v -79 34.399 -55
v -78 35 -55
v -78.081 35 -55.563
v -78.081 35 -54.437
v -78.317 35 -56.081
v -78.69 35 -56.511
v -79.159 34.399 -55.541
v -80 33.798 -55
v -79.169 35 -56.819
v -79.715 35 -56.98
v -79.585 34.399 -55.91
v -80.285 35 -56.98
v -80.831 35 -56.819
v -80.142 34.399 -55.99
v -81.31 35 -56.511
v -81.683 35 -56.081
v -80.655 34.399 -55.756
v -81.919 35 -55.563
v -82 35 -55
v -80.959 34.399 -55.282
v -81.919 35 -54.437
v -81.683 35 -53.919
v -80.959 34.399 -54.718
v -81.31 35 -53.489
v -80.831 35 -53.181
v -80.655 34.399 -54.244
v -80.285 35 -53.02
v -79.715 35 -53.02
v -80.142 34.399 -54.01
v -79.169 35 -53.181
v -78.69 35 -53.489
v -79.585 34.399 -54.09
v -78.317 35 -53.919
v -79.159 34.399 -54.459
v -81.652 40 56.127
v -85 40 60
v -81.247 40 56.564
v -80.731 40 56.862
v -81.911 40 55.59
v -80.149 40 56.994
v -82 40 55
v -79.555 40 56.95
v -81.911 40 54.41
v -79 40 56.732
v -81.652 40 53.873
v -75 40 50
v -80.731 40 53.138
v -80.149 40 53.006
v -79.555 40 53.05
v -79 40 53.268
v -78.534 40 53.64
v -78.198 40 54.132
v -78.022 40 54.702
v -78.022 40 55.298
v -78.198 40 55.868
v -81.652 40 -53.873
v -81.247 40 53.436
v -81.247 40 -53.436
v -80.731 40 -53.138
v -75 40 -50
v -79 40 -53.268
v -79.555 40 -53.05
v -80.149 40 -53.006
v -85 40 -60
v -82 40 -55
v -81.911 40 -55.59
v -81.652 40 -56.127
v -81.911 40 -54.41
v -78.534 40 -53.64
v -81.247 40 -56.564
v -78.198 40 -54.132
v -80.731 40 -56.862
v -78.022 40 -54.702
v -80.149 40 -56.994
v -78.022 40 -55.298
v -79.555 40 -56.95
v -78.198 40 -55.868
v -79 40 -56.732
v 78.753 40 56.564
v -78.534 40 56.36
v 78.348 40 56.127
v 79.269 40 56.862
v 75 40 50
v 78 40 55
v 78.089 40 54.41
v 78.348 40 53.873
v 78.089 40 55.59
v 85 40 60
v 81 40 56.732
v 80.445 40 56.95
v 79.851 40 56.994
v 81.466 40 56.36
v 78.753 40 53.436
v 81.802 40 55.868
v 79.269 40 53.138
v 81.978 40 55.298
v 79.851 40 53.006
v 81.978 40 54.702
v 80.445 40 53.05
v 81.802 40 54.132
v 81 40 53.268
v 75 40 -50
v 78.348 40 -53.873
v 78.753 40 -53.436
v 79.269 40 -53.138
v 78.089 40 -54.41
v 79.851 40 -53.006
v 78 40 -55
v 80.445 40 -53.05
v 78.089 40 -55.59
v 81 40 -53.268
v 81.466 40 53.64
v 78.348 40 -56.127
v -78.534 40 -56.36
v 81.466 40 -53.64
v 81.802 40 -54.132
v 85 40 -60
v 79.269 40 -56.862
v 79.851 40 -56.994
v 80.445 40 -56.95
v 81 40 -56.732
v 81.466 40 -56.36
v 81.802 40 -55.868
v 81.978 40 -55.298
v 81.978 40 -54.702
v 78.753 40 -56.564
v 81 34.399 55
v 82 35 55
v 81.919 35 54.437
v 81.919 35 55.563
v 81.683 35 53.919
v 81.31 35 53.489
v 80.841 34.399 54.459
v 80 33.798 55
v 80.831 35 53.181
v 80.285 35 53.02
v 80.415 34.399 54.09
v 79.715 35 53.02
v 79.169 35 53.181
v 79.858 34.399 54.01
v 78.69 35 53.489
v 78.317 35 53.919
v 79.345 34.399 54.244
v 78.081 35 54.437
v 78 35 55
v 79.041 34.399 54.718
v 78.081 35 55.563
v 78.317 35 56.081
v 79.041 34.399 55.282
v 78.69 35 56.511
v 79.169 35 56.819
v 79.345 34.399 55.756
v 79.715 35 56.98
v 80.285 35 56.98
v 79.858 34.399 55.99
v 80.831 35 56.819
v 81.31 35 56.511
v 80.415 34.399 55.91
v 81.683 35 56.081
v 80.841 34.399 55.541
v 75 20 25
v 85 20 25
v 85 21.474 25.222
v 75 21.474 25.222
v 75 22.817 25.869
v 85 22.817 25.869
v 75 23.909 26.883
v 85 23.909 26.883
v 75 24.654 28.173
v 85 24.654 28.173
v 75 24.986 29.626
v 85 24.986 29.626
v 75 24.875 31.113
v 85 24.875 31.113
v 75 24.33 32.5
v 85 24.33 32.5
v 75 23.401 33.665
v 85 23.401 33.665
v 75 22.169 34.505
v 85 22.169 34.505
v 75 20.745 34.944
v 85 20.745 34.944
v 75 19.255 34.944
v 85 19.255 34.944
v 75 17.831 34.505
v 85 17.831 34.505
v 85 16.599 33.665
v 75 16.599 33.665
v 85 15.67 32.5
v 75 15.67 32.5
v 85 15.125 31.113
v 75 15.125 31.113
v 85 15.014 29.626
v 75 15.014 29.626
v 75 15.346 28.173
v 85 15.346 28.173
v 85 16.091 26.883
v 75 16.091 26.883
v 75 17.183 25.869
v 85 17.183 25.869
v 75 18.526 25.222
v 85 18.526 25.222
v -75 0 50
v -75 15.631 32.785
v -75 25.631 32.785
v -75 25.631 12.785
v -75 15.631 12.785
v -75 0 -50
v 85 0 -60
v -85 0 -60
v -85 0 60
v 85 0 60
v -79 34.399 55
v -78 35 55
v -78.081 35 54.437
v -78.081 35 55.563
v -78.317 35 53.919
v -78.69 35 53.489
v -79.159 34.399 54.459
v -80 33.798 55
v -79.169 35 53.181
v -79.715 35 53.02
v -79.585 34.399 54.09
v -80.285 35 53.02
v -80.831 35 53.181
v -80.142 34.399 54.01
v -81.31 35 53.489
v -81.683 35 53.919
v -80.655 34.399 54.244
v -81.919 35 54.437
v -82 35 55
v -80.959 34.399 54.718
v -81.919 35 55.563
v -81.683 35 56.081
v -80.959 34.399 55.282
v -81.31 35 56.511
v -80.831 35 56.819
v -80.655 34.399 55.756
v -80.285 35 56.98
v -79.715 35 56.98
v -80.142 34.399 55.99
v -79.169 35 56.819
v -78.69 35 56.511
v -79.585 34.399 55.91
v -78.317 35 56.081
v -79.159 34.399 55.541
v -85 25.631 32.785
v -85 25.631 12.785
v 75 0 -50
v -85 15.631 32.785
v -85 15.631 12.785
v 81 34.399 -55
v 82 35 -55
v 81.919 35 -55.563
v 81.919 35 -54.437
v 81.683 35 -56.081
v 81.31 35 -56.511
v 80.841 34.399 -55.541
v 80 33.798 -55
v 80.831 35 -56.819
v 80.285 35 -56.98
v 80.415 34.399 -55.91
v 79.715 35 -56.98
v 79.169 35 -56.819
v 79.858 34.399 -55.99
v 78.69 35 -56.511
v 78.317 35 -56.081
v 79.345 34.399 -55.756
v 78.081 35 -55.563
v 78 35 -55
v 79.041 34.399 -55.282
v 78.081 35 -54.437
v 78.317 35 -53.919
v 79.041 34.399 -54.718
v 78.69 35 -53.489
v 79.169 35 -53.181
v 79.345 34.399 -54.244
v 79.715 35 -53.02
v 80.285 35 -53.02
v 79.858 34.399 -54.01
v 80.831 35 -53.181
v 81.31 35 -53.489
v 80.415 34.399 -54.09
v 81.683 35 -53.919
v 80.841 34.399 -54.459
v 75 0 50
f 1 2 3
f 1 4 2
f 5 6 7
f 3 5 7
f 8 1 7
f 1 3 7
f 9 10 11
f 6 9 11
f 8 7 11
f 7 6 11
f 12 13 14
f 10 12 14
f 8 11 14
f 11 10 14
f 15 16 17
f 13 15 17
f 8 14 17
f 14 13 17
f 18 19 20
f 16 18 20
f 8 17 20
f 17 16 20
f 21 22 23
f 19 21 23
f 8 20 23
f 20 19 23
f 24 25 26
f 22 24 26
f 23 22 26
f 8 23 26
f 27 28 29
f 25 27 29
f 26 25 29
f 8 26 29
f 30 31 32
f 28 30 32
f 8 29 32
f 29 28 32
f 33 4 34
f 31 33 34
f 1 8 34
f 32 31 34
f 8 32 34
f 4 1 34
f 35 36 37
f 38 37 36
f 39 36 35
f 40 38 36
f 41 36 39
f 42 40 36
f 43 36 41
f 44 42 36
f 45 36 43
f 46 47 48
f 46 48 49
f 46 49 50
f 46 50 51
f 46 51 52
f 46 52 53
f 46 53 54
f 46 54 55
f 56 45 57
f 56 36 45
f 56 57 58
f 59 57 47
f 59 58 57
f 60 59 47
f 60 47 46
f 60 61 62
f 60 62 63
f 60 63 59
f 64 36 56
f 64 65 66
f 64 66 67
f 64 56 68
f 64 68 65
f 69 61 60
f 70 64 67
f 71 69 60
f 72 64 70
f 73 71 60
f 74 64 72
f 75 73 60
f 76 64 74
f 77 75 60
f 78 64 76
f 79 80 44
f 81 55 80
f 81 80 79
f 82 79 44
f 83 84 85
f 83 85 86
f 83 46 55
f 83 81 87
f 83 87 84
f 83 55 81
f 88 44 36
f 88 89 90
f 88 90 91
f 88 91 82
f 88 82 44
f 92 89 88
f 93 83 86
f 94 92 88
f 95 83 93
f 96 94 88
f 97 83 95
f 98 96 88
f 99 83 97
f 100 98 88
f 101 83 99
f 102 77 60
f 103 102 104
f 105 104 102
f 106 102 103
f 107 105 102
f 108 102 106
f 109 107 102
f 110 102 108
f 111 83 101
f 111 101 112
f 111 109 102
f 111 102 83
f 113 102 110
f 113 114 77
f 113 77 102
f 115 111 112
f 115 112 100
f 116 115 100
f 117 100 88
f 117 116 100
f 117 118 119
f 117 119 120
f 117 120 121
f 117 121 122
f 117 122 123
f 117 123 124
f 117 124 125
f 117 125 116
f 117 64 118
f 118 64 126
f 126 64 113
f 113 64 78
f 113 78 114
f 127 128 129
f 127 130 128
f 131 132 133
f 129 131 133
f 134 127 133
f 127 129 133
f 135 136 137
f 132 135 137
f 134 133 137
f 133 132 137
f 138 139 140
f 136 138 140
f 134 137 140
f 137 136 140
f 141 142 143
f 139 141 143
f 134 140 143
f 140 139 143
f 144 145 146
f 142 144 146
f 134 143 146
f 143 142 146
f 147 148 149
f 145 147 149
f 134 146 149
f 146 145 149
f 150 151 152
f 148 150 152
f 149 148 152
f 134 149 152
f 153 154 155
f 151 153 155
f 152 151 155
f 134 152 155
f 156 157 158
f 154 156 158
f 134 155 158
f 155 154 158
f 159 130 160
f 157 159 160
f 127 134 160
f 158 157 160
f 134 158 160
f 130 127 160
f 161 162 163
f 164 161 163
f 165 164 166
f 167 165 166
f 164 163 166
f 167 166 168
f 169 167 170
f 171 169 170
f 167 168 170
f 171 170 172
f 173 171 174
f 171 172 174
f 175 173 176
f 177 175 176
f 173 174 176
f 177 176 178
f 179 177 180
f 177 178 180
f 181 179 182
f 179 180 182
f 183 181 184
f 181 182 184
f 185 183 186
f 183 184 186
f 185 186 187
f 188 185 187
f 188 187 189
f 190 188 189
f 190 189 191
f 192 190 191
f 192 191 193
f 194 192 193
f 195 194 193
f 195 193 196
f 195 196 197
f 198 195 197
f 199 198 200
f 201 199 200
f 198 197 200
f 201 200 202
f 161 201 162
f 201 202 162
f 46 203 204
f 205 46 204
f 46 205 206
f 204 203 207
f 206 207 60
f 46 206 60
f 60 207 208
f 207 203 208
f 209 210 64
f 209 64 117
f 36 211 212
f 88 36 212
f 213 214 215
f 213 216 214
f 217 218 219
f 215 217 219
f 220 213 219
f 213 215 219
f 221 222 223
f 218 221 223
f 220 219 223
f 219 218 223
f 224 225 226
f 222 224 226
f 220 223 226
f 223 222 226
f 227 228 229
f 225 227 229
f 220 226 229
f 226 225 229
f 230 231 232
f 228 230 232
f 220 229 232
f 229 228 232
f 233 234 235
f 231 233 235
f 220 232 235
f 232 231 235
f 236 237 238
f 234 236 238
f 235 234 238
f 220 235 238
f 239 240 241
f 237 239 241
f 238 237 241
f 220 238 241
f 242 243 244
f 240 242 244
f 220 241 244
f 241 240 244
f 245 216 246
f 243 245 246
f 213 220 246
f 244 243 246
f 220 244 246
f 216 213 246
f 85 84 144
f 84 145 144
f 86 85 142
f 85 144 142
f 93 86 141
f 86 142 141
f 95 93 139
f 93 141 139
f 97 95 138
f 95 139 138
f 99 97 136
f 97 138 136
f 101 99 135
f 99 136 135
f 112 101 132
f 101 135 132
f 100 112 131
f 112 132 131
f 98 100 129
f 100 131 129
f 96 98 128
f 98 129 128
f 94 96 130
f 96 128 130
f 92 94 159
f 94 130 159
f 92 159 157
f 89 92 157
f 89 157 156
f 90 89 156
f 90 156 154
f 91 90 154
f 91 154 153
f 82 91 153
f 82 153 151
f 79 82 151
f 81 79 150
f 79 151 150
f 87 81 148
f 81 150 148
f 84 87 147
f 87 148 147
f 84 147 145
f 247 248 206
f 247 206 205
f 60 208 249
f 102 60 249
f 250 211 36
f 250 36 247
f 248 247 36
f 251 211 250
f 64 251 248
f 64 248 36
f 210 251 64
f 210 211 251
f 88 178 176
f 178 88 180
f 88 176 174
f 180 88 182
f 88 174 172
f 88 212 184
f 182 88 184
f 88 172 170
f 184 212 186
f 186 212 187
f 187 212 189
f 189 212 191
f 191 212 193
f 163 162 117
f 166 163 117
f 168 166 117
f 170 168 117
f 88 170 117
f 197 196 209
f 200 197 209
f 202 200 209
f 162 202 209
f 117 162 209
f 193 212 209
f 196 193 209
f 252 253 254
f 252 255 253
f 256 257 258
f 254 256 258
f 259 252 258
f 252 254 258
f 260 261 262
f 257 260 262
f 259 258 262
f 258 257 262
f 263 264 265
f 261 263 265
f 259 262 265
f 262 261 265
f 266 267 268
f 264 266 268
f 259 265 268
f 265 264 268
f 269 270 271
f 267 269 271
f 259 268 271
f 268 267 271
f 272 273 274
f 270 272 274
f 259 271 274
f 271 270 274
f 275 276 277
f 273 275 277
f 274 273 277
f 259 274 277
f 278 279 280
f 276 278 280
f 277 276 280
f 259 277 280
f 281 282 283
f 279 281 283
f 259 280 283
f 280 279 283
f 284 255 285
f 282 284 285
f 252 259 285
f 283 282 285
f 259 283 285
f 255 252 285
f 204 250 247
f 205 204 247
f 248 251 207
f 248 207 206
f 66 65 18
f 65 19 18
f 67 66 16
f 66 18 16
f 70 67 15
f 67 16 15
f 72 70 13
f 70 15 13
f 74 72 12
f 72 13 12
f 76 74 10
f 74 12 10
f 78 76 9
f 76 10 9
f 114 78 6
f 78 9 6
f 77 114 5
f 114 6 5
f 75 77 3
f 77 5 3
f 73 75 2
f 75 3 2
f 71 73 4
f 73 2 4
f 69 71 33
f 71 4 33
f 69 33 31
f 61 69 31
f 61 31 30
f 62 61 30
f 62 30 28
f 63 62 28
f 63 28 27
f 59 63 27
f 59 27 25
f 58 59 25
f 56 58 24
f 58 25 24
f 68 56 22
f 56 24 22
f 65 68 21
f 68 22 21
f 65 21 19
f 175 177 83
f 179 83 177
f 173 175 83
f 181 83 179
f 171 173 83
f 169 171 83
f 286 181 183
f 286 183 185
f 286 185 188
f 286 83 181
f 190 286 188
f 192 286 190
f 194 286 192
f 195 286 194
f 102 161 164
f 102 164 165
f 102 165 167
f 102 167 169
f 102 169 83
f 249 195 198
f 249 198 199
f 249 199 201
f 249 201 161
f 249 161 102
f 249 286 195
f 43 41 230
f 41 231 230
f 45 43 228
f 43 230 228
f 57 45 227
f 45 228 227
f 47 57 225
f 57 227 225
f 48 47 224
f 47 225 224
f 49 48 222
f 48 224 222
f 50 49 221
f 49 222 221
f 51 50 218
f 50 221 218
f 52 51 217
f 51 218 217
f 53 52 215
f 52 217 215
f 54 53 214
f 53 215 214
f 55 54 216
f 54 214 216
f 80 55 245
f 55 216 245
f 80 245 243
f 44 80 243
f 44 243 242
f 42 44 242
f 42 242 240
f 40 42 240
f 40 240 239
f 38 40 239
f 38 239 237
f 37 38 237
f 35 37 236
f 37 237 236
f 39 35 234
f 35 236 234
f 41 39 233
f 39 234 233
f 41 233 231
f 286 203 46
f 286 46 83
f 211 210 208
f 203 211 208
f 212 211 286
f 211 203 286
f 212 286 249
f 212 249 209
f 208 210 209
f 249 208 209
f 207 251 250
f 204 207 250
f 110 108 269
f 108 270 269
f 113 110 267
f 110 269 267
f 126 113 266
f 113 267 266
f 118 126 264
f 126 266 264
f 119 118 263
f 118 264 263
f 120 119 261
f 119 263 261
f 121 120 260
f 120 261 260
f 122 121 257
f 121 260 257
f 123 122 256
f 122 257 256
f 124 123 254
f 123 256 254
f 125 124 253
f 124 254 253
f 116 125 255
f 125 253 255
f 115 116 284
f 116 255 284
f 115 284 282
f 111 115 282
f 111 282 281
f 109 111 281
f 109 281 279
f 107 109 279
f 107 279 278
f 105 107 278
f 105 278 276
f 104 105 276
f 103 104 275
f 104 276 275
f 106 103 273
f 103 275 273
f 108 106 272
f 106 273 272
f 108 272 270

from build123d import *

# Parameters (mm, degrees)
SKETCH1_W                 = 170
SKETCH1_H                 = 120
SKETCH1_W_2               = 150
SKETCH1_H_2               = 100
EXTRUDE_THIN1_DEPTH       = 40
SKETCH2_R                 = 5
CUT_EXTRUDE1_DEPTH        = 10
F_4_0MM_DOWEL_HOLE1_D     = 4
F_4_0MM_DOWEL_HOLE1_DEPTH = 5
F_4_0MM_DOWEL_HOLE1_TIP   = 1.201721238
F_4_0MM_DOWEL_HOLE2_D     = 4
F_4_0MM_DOWEL_HOLE2_DEPTH = 5
F_4_0MM_DOWEL_HOLE2_TIP   = 1.201721238
F_4_0MM_DOWEL_HOLE3_D     = 4
F_4_0MM_DOWEL_HOLE3_DEPTH = 5
F_4_0MM_DOWEL_HOLE3_TIP   = 1.201721238
F_4_0MM_DOWEL_HOLE4_D     = 4
F_4_0MM_DOWEL_HOLE4_DEPTH = 5
F_4_0MM_DOWEL_HOLE4_TIP   = 1.201721238
SKETCH15_W                = 20
SKETCH15_H                = 10
CUT_EXTRUDE7_DEPTH        = 10


with BuildPart() as part:
    # Sketch1 → Extrude-Thin1 (new body)
    with BuildSketch(Plane(origin=(0, 0, 0), x_dir=(1, 0, 0), z_dir=(0, 1, 0))):
        Rectangle(SKETCH1_W, SKETCH1_H)
        Rectangle(SKETCH1_W_2, SKETCH1_H_2, mode=Mode.SUBTRACT)
    extrude(amount=EXTRUDE_THIN1_DEPTH)

    # Sketch2 → Cut-Extrude1 (cut)
    with BuildSketch(Plane(origin=(85, 0, 0), x_dir=(0, 0, -1), z_dir=(1, 0, 0))):
        with Locations((-30, 20)):
            Circle(SKETCH2_R)
    extrude(amount=-CUT_EXTRUDE1_DEPTH, mode=Mode.SUBTRACT)

    # Ø4.0mm Dowel Hole1
    with Locations(Plane(origin=(0, 40, 0), x_dir=(1, 0, 0), z_dir=(0, 1, 0))):
        with Locations((-80, 55)):
            Hole(F_4_0MM_DOWEL_HOLE1_D / 2, depth=F_4_0MM_DOWEL_HOLE1_DEPTH)
            with Locations((0, 0, -(F_4_0MM_DOWEL_HOLE1_DEPTH + F_4_0MM_DOWEL_HOLE1_TIP / 2))):  # 118° drill point
                Cone(0, F_4_0MM_DOWEL_HOLE1_D / 2, F_4_0MM_DOWEL_HOLE1_TIP, mode=Mode.SUBTRACT)

    # Ø4.0mm Dowel Hole2
    with Locations(Plane(origin=(0, 40, 0), x_dir=(1, 0, 0), z_dir=(0, 1, 0))):
        with Locations((-80, -55)):
            Hole(F_4_0MM_DOWEL_HOLE2_D / 2, depth=F_4_0MM_DOWEL_HOLE2_DEPTH)
            with Locations((0, 0, -(F_4_0MM_DOWEL_HOLE2_DEPTH + F_4_0MM_DOWEL_HOLE2_TIP / 2))):  # 118° drill point
                Cone(0, F_4_0MM_DOWEL_HOLE2_D / 2, F_4_0MM_DOWEL_HOLE2_TIP, mode=Mode.SUBTRACT)

    # Ø4.0mm Dowel Hole3
    with Locations(Plane(origin=(0, 40, 0), x_dir=(1, 0, 0), z_dir=(0, 1, 0))):
        with Locations((80, -55)):
            Hole(F_4_0MM_DOWEL_HOLE3_D / 2, depth=F_4_0MM_DOWEL_HOLE3_DEPTH)
            with Locations((0, 0, -(F_4_0MM_DOWEL_HOLE3_DEPTH + F_4_0MM_DOWEL_HOLE3_TIP / 2))):  # 118° drill point
                Cone(0, F_4_0MM_DOWEL_HOLE3_D / 2, F_4_0MM_DOWEL_HOLE3_TIP, mode=Mode.SUBTRACT)

    # Ø4.0mm Dowel Hole4
    with Locations(Plane(origin=(0, 40, 0), x_dir=(1, 0, 0), z_dir=(0, 1, 0))):
        with Locations((80, 55)):
            Hole(F_4_0MM_DOWEL_HOLE4_D / 2, depth=F_4_0MM_DOWEL_HOLE4_DEPTH)
            with Locations((0, 0, -(F_4_0MM_DOWEL_HOLE4_DEPTH + F_4_0MM_DOWEL_HOLE4_TIP / 2))):  # 118° drill point
                Cone(0, F_4_0MM_DOWEL_HOLE4_D / 2, F_4_0MM_DOWEL_HOLE4_TIP, mode=Mode.SUBTRACT)

    # Sketch15 → Cut-Extrude7 (cut)
    with BuildSketch(Plane.ZY.offset(85)):
        with Locations((22.785330455, 20.631239888)):
            Rectangle(SKETCH15_W, SKETCH15_H)
    extrude(amount=-CUT_EXTRUDE7_DEPTH, mode=Mode.SUBTRACT)


solid = part.part
